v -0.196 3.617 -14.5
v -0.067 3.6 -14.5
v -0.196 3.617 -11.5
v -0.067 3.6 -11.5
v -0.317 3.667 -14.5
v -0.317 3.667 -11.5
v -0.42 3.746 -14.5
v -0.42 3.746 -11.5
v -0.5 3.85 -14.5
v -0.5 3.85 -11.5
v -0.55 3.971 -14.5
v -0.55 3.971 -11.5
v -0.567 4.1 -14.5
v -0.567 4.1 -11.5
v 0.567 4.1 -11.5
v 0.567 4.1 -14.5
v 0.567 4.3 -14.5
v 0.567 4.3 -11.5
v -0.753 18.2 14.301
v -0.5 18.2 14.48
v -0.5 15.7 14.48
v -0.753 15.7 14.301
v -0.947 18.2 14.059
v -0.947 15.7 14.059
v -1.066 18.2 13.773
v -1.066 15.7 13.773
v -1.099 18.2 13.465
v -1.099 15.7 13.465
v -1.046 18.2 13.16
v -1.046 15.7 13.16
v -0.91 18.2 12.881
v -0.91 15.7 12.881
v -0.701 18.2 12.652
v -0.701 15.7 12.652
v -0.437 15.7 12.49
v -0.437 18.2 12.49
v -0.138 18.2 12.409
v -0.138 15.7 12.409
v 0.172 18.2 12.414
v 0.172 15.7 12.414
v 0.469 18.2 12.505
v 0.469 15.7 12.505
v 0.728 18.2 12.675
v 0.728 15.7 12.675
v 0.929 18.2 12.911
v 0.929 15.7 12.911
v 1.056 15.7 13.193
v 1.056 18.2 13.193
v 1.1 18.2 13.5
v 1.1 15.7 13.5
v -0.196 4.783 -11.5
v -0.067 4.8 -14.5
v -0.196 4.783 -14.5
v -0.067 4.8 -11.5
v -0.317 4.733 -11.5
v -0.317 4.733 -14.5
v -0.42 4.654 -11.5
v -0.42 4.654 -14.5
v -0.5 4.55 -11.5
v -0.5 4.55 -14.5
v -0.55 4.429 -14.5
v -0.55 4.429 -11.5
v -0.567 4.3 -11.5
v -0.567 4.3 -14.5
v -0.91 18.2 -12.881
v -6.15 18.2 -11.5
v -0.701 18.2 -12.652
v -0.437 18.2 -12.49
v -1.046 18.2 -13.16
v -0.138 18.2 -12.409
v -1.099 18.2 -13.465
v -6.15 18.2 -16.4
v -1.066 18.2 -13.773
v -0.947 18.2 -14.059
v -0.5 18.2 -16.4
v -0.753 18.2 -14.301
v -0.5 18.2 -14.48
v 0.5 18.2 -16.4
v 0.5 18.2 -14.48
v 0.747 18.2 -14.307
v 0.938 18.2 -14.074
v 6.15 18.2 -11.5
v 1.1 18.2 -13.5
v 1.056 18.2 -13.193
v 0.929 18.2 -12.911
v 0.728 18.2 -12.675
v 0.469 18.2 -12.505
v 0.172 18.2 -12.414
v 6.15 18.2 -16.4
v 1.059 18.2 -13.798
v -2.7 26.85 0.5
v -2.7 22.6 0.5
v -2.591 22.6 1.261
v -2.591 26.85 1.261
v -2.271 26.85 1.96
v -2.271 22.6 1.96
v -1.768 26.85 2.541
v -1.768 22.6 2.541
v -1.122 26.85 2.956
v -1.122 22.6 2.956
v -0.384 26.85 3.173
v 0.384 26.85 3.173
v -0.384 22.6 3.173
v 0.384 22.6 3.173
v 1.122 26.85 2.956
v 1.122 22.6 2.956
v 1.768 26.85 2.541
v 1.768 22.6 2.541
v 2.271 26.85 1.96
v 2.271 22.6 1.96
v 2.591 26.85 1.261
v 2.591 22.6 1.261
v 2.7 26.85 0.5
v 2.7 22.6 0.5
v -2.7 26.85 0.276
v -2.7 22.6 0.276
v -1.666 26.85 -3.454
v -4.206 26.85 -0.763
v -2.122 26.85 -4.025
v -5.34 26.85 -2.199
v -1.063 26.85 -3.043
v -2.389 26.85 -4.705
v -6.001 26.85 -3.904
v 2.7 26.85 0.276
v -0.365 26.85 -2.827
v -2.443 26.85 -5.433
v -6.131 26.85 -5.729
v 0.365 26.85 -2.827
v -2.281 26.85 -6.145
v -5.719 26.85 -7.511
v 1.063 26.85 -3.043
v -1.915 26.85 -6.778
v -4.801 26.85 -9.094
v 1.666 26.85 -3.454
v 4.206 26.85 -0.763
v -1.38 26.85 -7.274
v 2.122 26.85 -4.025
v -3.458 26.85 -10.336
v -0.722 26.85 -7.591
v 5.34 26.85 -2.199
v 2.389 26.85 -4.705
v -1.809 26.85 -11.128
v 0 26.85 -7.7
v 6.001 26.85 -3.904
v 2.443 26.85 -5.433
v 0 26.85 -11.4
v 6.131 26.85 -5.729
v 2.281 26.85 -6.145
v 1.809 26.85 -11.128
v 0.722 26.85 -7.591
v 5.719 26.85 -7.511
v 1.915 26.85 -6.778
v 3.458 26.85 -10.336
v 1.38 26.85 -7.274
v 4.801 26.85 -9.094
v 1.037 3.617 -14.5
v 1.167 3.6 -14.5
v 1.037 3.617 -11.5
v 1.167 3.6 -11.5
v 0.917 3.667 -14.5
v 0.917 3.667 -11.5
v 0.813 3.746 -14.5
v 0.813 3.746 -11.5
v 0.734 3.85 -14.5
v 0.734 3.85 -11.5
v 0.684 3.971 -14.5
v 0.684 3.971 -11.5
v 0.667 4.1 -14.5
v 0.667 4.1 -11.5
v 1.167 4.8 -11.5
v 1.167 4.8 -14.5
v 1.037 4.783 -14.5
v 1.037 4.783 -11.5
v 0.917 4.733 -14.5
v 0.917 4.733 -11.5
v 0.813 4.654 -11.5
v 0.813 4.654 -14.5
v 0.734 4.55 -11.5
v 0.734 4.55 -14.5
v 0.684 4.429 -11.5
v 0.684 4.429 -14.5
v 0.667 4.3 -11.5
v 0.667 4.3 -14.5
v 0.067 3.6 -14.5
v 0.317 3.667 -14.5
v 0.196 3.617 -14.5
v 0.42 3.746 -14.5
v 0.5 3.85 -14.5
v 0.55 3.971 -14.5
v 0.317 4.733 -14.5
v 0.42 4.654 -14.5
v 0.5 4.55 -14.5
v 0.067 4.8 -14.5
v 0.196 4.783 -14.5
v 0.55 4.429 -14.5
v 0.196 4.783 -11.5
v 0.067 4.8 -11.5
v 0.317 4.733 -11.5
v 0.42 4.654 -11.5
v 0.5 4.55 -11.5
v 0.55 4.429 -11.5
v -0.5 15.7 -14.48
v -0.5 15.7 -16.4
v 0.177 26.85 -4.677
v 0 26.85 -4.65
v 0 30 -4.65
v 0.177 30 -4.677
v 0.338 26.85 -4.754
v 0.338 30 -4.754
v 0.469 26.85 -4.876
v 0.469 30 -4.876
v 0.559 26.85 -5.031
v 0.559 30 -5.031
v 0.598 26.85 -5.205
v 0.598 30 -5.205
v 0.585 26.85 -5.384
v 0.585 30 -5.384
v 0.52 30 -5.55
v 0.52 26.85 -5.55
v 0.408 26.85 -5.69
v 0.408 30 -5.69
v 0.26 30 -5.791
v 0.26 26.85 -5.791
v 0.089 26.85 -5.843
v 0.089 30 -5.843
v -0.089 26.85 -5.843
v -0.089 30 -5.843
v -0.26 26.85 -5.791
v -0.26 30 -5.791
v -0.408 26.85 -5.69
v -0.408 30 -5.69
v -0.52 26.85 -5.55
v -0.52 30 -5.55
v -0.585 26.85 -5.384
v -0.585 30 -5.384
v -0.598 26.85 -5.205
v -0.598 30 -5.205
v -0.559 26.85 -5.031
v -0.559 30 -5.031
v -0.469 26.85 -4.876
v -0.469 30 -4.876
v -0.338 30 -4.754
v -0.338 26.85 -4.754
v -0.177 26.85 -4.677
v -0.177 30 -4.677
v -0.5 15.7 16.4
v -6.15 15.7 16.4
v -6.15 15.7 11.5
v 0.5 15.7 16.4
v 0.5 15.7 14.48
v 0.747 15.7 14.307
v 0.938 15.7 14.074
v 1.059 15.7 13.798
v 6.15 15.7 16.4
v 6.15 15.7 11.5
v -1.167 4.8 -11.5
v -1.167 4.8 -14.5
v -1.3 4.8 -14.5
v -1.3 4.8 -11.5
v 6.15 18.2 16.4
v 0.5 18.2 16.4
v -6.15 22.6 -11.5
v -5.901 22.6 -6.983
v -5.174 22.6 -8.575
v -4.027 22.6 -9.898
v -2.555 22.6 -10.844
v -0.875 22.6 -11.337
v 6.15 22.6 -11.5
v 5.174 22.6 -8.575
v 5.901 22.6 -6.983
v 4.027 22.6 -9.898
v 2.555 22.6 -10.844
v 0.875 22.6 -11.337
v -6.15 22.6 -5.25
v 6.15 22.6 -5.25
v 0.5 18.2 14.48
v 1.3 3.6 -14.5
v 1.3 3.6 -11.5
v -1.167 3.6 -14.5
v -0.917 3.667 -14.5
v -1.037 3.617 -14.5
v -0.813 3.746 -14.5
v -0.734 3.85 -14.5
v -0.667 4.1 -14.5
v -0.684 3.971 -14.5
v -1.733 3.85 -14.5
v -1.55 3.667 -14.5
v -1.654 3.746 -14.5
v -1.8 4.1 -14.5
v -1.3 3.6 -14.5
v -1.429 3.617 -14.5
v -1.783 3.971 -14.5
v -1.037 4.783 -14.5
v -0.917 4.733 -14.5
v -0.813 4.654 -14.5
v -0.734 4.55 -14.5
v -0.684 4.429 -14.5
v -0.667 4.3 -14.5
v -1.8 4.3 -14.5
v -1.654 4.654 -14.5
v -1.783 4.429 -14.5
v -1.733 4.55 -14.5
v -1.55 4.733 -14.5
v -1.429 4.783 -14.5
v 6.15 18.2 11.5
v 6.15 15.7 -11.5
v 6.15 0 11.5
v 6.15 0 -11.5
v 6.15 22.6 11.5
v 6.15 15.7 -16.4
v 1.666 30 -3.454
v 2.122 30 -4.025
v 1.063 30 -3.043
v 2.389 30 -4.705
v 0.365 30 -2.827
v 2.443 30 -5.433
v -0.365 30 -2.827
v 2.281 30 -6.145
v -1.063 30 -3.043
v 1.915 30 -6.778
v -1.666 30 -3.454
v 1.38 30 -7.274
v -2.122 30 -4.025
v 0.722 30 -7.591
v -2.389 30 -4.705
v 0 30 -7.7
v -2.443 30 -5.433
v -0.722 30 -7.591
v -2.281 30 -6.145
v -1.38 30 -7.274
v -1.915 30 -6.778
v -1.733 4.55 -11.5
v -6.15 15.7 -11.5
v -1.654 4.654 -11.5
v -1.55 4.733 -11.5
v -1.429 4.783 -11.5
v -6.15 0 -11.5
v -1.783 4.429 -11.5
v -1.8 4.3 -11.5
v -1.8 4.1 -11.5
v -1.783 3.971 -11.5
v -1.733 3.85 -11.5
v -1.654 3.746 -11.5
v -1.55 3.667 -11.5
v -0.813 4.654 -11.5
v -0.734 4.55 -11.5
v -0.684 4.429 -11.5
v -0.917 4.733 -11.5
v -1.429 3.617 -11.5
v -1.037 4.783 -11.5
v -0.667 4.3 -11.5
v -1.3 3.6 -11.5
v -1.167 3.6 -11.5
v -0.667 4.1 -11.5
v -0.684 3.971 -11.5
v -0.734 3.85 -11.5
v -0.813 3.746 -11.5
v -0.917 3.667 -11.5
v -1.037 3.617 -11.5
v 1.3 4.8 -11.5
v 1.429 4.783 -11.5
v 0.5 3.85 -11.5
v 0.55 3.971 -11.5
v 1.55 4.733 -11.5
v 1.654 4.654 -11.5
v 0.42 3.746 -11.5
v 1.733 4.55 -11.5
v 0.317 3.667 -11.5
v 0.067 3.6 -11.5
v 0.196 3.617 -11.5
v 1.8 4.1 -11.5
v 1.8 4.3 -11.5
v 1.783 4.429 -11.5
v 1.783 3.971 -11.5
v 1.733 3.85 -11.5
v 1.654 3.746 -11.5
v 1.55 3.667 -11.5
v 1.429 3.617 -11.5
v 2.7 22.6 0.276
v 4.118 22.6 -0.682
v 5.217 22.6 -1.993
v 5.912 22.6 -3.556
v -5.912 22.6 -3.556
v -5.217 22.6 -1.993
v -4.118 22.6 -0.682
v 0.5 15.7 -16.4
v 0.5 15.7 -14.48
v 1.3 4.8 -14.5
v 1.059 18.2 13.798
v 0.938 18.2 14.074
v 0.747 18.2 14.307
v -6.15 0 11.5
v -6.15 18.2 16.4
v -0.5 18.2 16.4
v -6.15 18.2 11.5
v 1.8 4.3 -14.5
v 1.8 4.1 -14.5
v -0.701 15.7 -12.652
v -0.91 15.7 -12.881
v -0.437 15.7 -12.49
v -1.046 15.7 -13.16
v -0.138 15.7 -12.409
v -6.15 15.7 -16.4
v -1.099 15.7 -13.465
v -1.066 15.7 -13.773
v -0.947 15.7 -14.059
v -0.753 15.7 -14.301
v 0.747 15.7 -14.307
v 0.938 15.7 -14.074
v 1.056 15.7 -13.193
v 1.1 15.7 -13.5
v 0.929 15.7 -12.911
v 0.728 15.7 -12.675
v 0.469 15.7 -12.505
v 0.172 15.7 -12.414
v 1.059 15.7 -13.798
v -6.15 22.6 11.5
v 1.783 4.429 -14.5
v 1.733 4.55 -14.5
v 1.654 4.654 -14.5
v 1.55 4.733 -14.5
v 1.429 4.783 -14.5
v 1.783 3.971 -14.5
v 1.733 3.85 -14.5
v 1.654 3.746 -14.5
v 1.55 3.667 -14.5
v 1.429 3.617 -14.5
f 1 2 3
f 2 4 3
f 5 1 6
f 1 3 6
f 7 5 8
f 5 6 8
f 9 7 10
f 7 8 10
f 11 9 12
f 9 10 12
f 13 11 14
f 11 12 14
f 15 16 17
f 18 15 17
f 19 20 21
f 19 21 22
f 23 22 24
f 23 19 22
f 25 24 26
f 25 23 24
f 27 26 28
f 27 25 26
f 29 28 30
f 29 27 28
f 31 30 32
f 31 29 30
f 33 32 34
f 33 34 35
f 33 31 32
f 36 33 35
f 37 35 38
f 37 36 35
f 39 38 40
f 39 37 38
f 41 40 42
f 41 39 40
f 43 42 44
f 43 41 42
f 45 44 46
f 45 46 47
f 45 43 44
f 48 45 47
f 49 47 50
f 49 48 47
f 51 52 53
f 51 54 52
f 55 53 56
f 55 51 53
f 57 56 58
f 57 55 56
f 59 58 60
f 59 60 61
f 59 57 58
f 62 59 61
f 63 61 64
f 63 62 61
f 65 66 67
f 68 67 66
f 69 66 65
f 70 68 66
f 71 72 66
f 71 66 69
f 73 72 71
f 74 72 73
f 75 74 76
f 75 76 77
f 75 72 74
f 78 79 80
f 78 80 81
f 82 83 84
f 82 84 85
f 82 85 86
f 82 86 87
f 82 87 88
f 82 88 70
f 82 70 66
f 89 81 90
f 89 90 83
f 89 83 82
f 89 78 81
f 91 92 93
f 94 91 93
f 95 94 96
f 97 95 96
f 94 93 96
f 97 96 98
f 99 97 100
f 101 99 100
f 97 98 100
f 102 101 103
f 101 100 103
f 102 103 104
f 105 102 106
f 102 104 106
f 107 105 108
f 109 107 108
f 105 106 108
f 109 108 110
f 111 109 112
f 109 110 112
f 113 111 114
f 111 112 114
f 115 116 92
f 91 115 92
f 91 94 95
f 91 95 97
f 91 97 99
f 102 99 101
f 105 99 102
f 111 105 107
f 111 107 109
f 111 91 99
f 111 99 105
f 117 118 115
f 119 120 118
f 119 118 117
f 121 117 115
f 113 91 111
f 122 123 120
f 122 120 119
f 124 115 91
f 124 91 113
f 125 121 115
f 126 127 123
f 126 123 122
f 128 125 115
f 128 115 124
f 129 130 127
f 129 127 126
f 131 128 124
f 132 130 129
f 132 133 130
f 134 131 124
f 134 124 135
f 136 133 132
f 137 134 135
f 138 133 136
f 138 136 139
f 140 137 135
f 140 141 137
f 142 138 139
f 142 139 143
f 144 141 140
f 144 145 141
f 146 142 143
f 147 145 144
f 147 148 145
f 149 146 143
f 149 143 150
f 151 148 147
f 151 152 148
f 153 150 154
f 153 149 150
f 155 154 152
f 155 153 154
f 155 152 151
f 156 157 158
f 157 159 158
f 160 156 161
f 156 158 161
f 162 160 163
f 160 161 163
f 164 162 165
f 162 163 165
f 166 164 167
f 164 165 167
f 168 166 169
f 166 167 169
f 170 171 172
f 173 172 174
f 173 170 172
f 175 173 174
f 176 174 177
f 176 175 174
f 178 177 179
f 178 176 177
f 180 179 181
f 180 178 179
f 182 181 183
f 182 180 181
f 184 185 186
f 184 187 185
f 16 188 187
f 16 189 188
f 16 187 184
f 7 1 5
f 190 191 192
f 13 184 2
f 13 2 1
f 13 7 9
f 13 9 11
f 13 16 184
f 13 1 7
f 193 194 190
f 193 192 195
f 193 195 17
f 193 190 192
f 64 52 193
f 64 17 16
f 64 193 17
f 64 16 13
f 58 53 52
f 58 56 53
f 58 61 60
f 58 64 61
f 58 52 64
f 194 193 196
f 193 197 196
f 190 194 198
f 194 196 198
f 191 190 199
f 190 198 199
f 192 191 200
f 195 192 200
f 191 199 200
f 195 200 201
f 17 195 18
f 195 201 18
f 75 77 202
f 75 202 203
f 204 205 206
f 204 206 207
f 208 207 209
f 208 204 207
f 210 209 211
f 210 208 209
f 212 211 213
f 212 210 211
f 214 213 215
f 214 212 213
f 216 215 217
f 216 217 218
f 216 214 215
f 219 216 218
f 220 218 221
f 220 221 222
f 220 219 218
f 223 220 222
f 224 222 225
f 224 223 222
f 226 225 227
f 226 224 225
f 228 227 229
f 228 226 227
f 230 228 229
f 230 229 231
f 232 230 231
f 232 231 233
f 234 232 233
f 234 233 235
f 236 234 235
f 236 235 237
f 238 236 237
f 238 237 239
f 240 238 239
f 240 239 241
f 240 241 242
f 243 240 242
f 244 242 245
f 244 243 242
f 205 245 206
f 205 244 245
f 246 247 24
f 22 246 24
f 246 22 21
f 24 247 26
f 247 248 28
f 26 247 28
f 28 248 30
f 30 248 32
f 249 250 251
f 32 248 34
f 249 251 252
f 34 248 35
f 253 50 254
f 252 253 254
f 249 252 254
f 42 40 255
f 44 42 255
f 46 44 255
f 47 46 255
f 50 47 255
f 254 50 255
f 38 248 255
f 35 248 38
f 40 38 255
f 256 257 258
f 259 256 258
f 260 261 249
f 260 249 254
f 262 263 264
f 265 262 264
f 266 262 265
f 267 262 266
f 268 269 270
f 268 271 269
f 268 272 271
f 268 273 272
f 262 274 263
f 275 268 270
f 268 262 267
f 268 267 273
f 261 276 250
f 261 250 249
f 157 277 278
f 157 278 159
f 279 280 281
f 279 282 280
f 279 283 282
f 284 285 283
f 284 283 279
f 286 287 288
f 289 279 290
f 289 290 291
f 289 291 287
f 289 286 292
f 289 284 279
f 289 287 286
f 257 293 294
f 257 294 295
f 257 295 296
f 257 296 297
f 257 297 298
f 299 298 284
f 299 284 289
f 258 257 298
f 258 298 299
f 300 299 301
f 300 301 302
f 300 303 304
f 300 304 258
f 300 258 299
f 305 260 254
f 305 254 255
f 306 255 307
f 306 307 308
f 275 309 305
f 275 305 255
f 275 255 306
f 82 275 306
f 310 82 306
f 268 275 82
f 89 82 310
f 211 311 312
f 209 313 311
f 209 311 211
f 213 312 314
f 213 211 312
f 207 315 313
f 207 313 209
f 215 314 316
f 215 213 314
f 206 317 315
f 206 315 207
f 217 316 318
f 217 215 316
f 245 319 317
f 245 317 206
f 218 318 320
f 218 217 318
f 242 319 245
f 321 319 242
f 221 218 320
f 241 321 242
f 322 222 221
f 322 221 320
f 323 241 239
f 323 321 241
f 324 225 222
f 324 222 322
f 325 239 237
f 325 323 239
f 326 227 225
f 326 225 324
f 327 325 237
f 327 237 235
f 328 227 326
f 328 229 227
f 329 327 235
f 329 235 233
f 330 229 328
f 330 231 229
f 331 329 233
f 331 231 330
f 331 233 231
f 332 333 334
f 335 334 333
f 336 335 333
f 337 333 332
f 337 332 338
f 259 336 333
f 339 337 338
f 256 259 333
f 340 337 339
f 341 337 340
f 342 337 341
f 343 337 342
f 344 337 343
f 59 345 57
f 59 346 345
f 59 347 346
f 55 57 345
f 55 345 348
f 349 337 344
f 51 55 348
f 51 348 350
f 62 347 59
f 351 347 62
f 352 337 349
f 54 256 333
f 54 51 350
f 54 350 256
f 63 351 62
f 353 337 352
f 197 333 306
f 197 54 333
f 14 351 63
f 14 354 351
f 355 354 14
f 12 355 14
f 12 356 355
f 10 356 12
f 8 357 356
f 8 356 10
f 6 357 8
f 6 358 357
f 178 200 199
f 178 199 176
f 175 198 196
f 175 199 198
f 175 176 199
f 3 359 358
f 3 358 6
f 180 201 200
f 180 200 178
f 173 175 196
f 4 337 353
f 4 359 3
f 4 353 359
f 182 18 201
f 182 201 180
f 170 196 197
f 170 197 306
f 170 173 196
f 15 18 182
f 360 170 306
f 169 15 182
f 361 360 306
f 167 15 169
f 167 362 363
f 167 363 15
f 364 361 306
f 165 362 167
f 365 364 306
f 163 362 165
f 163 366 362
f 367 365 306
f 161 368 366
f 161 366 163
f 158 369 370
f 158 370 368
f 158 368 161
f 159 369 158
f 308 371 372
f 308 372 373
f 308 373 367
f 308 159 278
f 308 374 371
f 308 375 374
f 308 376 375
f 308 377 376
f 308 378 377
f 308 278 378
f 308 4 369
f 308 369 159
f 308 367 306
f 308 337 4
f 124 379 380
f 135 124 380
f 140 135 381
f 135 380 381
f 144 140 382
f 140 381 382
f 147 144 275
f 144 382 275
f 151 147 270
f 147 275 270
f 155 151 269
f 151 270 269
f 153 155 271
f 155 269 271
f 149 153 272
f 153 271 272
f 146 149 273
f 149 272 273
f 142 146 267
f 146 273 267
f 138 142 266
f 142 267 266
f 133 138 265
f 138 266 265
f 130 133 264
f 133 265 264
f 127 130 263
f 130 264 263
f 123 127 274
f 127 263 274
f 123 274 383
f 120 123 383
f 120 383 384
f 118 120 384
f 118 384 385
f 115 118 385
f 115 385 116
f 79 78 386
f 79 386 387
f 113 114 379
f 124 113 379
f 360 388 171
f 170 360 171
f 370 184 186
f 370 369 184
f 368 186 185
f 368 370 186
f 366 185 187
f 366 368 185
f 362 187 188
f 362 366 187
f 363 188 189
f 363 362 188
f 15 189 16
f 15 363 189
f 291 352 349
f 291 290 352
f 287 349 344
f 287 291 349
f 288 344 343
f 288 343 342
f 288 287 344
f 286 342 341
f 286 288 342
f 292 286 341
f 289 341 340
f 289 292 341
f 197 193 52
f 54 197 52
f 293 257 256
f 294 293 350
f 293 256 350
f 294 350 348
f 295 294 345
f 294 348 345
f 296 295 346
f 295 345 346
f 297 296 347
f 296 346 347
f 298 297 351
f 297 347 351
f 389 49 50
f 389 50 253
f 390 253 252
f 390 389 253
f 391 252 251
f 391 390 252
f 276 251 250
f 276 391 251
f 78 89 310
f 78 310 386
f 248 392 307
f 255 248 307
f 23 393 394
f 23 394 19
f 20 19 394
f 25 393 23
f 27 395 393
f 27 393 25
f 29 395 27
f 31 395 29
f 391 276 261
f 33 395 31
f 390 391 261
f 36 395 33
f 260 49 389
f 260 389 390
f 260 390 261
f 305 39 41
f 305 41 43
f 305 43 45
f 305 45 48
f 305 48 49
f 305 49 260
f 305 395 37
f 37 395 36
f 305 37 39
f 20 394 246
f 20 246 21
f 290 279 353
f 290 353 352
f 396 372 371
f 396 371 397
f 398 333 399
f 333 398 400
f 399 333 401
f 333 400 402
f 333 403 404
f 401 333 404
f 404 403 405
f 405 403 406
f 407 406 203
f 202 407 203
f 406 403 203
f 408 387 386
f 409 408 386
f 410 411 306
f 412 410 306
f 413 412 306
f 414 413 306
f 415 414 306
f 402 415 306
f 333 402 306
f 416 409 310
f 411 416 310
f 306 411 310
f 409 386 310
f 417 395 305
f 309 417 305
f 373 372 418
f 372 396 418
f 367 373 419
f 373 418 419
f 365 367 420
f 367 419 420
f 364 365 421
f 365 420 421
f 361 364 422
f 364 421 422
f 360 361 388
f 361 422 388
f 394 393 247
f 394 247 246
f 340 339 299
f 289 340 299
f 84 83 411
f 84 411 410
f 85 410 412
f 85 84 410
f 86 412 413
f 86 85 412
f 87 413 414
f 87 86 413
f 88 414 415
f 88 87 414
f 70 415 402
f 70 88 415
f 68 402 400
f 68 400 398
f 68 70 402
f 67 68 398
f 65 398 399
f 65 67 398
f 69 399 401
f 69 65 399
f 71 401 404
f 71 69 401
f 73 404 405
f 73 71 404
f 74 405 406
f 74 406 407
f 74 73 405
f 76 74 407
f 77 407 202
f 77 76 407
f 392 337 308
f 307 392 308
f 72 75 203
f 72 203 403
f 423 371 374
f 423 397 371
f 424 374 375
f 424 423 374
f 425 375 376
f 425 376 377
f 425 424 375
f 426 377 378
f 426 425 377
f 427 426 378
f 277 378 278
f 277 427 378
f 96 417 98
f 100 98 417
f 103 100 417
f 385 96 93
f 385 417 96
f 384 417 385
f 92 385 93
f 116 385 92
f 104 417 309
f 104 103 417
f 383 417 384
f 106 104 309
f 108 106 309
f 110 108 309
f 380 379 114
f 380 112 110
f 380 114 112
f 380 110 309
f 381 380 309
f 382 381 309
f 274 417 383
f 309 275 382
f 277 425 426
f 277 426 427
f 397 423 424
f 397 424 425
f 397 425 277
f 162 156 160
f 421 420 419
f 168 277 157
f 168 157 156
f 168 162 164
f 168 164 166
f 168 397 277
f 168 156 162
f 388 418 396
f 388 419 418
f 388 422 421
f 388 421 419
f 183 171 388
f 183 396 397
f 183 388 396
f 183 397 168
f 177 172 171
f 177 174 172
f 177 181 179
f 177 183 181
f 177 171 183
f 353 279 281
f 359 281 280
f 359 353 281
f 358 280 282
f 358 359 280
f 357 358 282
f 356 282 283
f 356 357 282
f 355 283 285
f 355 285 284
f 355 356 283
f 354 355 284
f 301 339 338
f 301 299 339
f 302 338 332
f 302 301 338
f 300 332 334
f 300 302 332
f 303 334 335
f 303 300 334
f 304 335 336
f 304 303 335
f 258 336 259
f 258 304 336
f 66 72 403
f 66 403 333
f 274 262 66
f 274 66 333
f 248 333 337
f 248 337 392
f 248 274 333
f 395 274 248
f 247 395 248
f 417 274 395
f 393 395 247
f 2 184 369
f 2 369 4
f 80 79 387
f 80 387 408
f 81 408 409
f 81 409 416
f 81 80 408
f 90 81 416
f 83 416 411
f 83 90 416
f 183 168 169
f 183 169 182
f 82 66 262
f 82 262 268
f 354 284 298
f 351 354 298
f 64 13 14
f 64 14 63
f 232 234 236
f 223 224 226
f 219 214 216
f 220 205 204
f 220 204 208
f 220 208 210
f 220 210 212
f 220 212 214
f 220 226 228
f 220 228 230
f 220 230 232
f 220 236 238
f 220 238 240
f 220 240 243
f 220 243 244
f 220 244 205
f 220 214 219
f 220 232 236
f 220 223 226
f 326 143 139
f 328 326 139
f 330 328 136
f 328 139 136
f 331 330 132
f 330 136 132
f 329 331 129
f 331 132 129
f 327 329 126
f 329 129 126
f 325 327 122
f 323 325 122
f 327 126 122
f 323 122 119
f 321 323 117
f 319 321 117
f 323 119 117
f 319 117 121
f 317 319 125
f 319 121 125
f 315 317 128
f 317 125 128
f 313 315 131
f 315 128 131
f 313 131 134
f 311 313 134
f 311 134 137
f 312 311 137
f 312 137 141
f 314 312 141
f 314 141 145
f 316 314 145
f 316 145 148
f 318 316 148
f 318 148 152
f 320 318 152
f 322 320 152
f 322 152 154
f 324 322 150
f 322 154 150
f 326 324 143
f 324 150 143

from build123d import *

# Parameters (mm, degrees)
IZIM1_W                     = 12.3
IZIM1_H                     = 23
Y_KSEKLIK_EKSTR_ZYON1_DEPTH = 22.6
Y_KSEKLIK_EKSTR_ZYON2_DEPTH = 2.5
IZIM3_W                     = 3.6
IZIM3_H                     = 3
Y_KSEKLIK_EKSTR_ZYON3_DEPTH = 1.2
IZIM4_R                     = 6.15
Y_KSEKLIK_EKSTR_ZYON4_DEPTH = 4.25
IZIM5_R                     = 2.45
IZIM5_R_2                   = 0.6
Y_KSEKLIK_EKSTR_ZYON6_DEPTH = 3.15
IZIM6_W                     = 0.1
IZIM6_H                     = 1.2
KES_EKSTR_ZYON1_DEPTH       = 3
RADYUS1_R                   = 0.5


with BuildPart() as part:
    # Çizim1 → Yükseklik-Ekstrüzyon1 (new body)
    with BuildSketch(Plane(origin=(0, 0, 0), x_dir=(1, 0, 0), z_dir=(0, 1, 0))):
        Rectangle(IZIM1_W, IZIM1_H)
    extrude(amount=Y_KSEKLIK_EKSTR_ZYON1_DEPTH)

    # Çizim2 → Yükseklik-Ekstrüzyon2 (add)
    with BuildSketch(Plane(origin=(0, 18.2, 0), x_dir=(1, 0, 0), z_dir=(0, 1, 0))):
        with BuildLine():
            Line((-6.15, 16.4), (-6.15, -16.4))
            Line((-6.15, -16.4), (-0.5, -16.4))
            Line((-0.5, -16.4), (-0.5, -14.479795897))
            ThreePointArc((-0.5, -14.479795897), (-0.574456265, -12.561916848), (1.1, -13.5))
            ThreePointArc((1.1, -13.5), (0.938083152, -14.074456265), (0.5, -14.479795897))
            Line((0.5, -14.479795897), (0.5, -16.4))
            Line((0.5, -16.4), (6.15, -16.4))
            Line((6.15, -16.4), (6.15, 16.4))
            Line((6.15, 16.4), (0.5, 16.4))
            Line((0.5, 16.4), (0.5, 14.479795897))
            ThreePointArc((0.5, 14.479795897), (0.938083152, 14.074456265), (1.1, 13.5))
            ThreePointArc((1.1, 13.5), (-0.574456265, 12.561916848), (-0.5, 14.479795897))
            Line((-0.5, 14.479795897), (-0.5, 16.4))
            Line((-0.5, 16.4), (-6.15, 16.4))
        make_face()
    extrude(amount=-Y_KSEKLIK_EKSTR_ZYON2_DEPTH)

    # Çizim3 → Yükseklik-Ekstrüzyon3 (add)
    with BuildSketch(Plane(origin=(0, 4.8, 0), x_dir=(-1, 0, 0), z_dir=(0, -1, 0))):
        with Locations((0, 13)):
            Rectangle(IZIM3_W, IZIM3_H)
    extrude(amount=Y_KSEKLIK_EKSTR_ZYON3_DEPTH)

    # Çizim4 → Yükseklik-Ekstrüzyon4 (add)
    with BuildSketch(Plane(origin=(0, 22.6, 0), x_dir=(1, 0, 0), z_dir=(0, 1, 0))):
        with Locations((0, 5.25)):
            Circle(IZIM4_R)
        with BuildLine():
            Line((-2.7, -0.275622137), (-2.7, -0.5))
            ThreePointArc((-2.7, -0.5), (0, -3.2), (2.7, -0.5))
            Line((2.7, -0.5), (2.7, -0.275622137))
            ThreePointArc((2.7, -0.275622137), (0, -0.9), (-2.7, -0.275622137))
        make_face()
    extrude(amount=Y_KSEKLIK_EKSTR_ZYON4_DEPTH)

    # Çizim5 → Yükseklik-Ekstrüzyon6 (add)
    with BuildSketch(Plane(origin=(0, 26.85, 0), x_dir=(1, 0, 0), z_dir=(0, 1, 0))):
        with Locations(Location((0, 5.25, 0), (0, 0, 90))):
            Circle(IZIM5_R)
        with Locations(Location((0, 5.25, 0), (0, 0, 270))):
            Circle(IZIM5_R_2, mode=Mode.SUBTRACT)
    extrude(amount=Y_KSEKLIK_EKSTR_ZYON6_DEPTH)

    # Çizim6 → Kes-Ekstrüzyon1 (cut)
    with BuildSketch(Plane(origin=(0, 0, -14.5), x_dir=(-1, 0, 0), z_dir=(0, 0, -1))):
        with Locations((-0.616666667, 4.2)):
            Rectangle(IZIM6_W, IZIM6_H)
        with Locations((0.616666667, 4.2)):
            Rectangle(IZIM6_W, IZIM6_H)
    extrude(amount=-KES_EKSTR_ZYON1_DEPTH, mode=Mode.SUBTRACT)

    # Radyus1
    radyus1_edges = [part.edges().sort_by_distance(p)[0] for p in [
        (0.566666667, 3.6, -13),
        (0.566666667, 4.8, -13),
        (0.666666667, 4.8, -13),
        (0.666666667, 3.6, -13),
        (-0.666666667, 3.6, -13),
        (-0.666666667, 4.8, -13),
        (-0.566666667, 4.8, -13),
        (-0.566666667, 3.6, -13),
        (1.8, 4.8, -13),
        (-1.8, 4.8, -13),
        (1.8, 3.6, -13),
        (-1.8, 3.6, -13),
    ]]
    fillet(radyus1_edges, radius=RADYUS1_R)


solid = part.part
